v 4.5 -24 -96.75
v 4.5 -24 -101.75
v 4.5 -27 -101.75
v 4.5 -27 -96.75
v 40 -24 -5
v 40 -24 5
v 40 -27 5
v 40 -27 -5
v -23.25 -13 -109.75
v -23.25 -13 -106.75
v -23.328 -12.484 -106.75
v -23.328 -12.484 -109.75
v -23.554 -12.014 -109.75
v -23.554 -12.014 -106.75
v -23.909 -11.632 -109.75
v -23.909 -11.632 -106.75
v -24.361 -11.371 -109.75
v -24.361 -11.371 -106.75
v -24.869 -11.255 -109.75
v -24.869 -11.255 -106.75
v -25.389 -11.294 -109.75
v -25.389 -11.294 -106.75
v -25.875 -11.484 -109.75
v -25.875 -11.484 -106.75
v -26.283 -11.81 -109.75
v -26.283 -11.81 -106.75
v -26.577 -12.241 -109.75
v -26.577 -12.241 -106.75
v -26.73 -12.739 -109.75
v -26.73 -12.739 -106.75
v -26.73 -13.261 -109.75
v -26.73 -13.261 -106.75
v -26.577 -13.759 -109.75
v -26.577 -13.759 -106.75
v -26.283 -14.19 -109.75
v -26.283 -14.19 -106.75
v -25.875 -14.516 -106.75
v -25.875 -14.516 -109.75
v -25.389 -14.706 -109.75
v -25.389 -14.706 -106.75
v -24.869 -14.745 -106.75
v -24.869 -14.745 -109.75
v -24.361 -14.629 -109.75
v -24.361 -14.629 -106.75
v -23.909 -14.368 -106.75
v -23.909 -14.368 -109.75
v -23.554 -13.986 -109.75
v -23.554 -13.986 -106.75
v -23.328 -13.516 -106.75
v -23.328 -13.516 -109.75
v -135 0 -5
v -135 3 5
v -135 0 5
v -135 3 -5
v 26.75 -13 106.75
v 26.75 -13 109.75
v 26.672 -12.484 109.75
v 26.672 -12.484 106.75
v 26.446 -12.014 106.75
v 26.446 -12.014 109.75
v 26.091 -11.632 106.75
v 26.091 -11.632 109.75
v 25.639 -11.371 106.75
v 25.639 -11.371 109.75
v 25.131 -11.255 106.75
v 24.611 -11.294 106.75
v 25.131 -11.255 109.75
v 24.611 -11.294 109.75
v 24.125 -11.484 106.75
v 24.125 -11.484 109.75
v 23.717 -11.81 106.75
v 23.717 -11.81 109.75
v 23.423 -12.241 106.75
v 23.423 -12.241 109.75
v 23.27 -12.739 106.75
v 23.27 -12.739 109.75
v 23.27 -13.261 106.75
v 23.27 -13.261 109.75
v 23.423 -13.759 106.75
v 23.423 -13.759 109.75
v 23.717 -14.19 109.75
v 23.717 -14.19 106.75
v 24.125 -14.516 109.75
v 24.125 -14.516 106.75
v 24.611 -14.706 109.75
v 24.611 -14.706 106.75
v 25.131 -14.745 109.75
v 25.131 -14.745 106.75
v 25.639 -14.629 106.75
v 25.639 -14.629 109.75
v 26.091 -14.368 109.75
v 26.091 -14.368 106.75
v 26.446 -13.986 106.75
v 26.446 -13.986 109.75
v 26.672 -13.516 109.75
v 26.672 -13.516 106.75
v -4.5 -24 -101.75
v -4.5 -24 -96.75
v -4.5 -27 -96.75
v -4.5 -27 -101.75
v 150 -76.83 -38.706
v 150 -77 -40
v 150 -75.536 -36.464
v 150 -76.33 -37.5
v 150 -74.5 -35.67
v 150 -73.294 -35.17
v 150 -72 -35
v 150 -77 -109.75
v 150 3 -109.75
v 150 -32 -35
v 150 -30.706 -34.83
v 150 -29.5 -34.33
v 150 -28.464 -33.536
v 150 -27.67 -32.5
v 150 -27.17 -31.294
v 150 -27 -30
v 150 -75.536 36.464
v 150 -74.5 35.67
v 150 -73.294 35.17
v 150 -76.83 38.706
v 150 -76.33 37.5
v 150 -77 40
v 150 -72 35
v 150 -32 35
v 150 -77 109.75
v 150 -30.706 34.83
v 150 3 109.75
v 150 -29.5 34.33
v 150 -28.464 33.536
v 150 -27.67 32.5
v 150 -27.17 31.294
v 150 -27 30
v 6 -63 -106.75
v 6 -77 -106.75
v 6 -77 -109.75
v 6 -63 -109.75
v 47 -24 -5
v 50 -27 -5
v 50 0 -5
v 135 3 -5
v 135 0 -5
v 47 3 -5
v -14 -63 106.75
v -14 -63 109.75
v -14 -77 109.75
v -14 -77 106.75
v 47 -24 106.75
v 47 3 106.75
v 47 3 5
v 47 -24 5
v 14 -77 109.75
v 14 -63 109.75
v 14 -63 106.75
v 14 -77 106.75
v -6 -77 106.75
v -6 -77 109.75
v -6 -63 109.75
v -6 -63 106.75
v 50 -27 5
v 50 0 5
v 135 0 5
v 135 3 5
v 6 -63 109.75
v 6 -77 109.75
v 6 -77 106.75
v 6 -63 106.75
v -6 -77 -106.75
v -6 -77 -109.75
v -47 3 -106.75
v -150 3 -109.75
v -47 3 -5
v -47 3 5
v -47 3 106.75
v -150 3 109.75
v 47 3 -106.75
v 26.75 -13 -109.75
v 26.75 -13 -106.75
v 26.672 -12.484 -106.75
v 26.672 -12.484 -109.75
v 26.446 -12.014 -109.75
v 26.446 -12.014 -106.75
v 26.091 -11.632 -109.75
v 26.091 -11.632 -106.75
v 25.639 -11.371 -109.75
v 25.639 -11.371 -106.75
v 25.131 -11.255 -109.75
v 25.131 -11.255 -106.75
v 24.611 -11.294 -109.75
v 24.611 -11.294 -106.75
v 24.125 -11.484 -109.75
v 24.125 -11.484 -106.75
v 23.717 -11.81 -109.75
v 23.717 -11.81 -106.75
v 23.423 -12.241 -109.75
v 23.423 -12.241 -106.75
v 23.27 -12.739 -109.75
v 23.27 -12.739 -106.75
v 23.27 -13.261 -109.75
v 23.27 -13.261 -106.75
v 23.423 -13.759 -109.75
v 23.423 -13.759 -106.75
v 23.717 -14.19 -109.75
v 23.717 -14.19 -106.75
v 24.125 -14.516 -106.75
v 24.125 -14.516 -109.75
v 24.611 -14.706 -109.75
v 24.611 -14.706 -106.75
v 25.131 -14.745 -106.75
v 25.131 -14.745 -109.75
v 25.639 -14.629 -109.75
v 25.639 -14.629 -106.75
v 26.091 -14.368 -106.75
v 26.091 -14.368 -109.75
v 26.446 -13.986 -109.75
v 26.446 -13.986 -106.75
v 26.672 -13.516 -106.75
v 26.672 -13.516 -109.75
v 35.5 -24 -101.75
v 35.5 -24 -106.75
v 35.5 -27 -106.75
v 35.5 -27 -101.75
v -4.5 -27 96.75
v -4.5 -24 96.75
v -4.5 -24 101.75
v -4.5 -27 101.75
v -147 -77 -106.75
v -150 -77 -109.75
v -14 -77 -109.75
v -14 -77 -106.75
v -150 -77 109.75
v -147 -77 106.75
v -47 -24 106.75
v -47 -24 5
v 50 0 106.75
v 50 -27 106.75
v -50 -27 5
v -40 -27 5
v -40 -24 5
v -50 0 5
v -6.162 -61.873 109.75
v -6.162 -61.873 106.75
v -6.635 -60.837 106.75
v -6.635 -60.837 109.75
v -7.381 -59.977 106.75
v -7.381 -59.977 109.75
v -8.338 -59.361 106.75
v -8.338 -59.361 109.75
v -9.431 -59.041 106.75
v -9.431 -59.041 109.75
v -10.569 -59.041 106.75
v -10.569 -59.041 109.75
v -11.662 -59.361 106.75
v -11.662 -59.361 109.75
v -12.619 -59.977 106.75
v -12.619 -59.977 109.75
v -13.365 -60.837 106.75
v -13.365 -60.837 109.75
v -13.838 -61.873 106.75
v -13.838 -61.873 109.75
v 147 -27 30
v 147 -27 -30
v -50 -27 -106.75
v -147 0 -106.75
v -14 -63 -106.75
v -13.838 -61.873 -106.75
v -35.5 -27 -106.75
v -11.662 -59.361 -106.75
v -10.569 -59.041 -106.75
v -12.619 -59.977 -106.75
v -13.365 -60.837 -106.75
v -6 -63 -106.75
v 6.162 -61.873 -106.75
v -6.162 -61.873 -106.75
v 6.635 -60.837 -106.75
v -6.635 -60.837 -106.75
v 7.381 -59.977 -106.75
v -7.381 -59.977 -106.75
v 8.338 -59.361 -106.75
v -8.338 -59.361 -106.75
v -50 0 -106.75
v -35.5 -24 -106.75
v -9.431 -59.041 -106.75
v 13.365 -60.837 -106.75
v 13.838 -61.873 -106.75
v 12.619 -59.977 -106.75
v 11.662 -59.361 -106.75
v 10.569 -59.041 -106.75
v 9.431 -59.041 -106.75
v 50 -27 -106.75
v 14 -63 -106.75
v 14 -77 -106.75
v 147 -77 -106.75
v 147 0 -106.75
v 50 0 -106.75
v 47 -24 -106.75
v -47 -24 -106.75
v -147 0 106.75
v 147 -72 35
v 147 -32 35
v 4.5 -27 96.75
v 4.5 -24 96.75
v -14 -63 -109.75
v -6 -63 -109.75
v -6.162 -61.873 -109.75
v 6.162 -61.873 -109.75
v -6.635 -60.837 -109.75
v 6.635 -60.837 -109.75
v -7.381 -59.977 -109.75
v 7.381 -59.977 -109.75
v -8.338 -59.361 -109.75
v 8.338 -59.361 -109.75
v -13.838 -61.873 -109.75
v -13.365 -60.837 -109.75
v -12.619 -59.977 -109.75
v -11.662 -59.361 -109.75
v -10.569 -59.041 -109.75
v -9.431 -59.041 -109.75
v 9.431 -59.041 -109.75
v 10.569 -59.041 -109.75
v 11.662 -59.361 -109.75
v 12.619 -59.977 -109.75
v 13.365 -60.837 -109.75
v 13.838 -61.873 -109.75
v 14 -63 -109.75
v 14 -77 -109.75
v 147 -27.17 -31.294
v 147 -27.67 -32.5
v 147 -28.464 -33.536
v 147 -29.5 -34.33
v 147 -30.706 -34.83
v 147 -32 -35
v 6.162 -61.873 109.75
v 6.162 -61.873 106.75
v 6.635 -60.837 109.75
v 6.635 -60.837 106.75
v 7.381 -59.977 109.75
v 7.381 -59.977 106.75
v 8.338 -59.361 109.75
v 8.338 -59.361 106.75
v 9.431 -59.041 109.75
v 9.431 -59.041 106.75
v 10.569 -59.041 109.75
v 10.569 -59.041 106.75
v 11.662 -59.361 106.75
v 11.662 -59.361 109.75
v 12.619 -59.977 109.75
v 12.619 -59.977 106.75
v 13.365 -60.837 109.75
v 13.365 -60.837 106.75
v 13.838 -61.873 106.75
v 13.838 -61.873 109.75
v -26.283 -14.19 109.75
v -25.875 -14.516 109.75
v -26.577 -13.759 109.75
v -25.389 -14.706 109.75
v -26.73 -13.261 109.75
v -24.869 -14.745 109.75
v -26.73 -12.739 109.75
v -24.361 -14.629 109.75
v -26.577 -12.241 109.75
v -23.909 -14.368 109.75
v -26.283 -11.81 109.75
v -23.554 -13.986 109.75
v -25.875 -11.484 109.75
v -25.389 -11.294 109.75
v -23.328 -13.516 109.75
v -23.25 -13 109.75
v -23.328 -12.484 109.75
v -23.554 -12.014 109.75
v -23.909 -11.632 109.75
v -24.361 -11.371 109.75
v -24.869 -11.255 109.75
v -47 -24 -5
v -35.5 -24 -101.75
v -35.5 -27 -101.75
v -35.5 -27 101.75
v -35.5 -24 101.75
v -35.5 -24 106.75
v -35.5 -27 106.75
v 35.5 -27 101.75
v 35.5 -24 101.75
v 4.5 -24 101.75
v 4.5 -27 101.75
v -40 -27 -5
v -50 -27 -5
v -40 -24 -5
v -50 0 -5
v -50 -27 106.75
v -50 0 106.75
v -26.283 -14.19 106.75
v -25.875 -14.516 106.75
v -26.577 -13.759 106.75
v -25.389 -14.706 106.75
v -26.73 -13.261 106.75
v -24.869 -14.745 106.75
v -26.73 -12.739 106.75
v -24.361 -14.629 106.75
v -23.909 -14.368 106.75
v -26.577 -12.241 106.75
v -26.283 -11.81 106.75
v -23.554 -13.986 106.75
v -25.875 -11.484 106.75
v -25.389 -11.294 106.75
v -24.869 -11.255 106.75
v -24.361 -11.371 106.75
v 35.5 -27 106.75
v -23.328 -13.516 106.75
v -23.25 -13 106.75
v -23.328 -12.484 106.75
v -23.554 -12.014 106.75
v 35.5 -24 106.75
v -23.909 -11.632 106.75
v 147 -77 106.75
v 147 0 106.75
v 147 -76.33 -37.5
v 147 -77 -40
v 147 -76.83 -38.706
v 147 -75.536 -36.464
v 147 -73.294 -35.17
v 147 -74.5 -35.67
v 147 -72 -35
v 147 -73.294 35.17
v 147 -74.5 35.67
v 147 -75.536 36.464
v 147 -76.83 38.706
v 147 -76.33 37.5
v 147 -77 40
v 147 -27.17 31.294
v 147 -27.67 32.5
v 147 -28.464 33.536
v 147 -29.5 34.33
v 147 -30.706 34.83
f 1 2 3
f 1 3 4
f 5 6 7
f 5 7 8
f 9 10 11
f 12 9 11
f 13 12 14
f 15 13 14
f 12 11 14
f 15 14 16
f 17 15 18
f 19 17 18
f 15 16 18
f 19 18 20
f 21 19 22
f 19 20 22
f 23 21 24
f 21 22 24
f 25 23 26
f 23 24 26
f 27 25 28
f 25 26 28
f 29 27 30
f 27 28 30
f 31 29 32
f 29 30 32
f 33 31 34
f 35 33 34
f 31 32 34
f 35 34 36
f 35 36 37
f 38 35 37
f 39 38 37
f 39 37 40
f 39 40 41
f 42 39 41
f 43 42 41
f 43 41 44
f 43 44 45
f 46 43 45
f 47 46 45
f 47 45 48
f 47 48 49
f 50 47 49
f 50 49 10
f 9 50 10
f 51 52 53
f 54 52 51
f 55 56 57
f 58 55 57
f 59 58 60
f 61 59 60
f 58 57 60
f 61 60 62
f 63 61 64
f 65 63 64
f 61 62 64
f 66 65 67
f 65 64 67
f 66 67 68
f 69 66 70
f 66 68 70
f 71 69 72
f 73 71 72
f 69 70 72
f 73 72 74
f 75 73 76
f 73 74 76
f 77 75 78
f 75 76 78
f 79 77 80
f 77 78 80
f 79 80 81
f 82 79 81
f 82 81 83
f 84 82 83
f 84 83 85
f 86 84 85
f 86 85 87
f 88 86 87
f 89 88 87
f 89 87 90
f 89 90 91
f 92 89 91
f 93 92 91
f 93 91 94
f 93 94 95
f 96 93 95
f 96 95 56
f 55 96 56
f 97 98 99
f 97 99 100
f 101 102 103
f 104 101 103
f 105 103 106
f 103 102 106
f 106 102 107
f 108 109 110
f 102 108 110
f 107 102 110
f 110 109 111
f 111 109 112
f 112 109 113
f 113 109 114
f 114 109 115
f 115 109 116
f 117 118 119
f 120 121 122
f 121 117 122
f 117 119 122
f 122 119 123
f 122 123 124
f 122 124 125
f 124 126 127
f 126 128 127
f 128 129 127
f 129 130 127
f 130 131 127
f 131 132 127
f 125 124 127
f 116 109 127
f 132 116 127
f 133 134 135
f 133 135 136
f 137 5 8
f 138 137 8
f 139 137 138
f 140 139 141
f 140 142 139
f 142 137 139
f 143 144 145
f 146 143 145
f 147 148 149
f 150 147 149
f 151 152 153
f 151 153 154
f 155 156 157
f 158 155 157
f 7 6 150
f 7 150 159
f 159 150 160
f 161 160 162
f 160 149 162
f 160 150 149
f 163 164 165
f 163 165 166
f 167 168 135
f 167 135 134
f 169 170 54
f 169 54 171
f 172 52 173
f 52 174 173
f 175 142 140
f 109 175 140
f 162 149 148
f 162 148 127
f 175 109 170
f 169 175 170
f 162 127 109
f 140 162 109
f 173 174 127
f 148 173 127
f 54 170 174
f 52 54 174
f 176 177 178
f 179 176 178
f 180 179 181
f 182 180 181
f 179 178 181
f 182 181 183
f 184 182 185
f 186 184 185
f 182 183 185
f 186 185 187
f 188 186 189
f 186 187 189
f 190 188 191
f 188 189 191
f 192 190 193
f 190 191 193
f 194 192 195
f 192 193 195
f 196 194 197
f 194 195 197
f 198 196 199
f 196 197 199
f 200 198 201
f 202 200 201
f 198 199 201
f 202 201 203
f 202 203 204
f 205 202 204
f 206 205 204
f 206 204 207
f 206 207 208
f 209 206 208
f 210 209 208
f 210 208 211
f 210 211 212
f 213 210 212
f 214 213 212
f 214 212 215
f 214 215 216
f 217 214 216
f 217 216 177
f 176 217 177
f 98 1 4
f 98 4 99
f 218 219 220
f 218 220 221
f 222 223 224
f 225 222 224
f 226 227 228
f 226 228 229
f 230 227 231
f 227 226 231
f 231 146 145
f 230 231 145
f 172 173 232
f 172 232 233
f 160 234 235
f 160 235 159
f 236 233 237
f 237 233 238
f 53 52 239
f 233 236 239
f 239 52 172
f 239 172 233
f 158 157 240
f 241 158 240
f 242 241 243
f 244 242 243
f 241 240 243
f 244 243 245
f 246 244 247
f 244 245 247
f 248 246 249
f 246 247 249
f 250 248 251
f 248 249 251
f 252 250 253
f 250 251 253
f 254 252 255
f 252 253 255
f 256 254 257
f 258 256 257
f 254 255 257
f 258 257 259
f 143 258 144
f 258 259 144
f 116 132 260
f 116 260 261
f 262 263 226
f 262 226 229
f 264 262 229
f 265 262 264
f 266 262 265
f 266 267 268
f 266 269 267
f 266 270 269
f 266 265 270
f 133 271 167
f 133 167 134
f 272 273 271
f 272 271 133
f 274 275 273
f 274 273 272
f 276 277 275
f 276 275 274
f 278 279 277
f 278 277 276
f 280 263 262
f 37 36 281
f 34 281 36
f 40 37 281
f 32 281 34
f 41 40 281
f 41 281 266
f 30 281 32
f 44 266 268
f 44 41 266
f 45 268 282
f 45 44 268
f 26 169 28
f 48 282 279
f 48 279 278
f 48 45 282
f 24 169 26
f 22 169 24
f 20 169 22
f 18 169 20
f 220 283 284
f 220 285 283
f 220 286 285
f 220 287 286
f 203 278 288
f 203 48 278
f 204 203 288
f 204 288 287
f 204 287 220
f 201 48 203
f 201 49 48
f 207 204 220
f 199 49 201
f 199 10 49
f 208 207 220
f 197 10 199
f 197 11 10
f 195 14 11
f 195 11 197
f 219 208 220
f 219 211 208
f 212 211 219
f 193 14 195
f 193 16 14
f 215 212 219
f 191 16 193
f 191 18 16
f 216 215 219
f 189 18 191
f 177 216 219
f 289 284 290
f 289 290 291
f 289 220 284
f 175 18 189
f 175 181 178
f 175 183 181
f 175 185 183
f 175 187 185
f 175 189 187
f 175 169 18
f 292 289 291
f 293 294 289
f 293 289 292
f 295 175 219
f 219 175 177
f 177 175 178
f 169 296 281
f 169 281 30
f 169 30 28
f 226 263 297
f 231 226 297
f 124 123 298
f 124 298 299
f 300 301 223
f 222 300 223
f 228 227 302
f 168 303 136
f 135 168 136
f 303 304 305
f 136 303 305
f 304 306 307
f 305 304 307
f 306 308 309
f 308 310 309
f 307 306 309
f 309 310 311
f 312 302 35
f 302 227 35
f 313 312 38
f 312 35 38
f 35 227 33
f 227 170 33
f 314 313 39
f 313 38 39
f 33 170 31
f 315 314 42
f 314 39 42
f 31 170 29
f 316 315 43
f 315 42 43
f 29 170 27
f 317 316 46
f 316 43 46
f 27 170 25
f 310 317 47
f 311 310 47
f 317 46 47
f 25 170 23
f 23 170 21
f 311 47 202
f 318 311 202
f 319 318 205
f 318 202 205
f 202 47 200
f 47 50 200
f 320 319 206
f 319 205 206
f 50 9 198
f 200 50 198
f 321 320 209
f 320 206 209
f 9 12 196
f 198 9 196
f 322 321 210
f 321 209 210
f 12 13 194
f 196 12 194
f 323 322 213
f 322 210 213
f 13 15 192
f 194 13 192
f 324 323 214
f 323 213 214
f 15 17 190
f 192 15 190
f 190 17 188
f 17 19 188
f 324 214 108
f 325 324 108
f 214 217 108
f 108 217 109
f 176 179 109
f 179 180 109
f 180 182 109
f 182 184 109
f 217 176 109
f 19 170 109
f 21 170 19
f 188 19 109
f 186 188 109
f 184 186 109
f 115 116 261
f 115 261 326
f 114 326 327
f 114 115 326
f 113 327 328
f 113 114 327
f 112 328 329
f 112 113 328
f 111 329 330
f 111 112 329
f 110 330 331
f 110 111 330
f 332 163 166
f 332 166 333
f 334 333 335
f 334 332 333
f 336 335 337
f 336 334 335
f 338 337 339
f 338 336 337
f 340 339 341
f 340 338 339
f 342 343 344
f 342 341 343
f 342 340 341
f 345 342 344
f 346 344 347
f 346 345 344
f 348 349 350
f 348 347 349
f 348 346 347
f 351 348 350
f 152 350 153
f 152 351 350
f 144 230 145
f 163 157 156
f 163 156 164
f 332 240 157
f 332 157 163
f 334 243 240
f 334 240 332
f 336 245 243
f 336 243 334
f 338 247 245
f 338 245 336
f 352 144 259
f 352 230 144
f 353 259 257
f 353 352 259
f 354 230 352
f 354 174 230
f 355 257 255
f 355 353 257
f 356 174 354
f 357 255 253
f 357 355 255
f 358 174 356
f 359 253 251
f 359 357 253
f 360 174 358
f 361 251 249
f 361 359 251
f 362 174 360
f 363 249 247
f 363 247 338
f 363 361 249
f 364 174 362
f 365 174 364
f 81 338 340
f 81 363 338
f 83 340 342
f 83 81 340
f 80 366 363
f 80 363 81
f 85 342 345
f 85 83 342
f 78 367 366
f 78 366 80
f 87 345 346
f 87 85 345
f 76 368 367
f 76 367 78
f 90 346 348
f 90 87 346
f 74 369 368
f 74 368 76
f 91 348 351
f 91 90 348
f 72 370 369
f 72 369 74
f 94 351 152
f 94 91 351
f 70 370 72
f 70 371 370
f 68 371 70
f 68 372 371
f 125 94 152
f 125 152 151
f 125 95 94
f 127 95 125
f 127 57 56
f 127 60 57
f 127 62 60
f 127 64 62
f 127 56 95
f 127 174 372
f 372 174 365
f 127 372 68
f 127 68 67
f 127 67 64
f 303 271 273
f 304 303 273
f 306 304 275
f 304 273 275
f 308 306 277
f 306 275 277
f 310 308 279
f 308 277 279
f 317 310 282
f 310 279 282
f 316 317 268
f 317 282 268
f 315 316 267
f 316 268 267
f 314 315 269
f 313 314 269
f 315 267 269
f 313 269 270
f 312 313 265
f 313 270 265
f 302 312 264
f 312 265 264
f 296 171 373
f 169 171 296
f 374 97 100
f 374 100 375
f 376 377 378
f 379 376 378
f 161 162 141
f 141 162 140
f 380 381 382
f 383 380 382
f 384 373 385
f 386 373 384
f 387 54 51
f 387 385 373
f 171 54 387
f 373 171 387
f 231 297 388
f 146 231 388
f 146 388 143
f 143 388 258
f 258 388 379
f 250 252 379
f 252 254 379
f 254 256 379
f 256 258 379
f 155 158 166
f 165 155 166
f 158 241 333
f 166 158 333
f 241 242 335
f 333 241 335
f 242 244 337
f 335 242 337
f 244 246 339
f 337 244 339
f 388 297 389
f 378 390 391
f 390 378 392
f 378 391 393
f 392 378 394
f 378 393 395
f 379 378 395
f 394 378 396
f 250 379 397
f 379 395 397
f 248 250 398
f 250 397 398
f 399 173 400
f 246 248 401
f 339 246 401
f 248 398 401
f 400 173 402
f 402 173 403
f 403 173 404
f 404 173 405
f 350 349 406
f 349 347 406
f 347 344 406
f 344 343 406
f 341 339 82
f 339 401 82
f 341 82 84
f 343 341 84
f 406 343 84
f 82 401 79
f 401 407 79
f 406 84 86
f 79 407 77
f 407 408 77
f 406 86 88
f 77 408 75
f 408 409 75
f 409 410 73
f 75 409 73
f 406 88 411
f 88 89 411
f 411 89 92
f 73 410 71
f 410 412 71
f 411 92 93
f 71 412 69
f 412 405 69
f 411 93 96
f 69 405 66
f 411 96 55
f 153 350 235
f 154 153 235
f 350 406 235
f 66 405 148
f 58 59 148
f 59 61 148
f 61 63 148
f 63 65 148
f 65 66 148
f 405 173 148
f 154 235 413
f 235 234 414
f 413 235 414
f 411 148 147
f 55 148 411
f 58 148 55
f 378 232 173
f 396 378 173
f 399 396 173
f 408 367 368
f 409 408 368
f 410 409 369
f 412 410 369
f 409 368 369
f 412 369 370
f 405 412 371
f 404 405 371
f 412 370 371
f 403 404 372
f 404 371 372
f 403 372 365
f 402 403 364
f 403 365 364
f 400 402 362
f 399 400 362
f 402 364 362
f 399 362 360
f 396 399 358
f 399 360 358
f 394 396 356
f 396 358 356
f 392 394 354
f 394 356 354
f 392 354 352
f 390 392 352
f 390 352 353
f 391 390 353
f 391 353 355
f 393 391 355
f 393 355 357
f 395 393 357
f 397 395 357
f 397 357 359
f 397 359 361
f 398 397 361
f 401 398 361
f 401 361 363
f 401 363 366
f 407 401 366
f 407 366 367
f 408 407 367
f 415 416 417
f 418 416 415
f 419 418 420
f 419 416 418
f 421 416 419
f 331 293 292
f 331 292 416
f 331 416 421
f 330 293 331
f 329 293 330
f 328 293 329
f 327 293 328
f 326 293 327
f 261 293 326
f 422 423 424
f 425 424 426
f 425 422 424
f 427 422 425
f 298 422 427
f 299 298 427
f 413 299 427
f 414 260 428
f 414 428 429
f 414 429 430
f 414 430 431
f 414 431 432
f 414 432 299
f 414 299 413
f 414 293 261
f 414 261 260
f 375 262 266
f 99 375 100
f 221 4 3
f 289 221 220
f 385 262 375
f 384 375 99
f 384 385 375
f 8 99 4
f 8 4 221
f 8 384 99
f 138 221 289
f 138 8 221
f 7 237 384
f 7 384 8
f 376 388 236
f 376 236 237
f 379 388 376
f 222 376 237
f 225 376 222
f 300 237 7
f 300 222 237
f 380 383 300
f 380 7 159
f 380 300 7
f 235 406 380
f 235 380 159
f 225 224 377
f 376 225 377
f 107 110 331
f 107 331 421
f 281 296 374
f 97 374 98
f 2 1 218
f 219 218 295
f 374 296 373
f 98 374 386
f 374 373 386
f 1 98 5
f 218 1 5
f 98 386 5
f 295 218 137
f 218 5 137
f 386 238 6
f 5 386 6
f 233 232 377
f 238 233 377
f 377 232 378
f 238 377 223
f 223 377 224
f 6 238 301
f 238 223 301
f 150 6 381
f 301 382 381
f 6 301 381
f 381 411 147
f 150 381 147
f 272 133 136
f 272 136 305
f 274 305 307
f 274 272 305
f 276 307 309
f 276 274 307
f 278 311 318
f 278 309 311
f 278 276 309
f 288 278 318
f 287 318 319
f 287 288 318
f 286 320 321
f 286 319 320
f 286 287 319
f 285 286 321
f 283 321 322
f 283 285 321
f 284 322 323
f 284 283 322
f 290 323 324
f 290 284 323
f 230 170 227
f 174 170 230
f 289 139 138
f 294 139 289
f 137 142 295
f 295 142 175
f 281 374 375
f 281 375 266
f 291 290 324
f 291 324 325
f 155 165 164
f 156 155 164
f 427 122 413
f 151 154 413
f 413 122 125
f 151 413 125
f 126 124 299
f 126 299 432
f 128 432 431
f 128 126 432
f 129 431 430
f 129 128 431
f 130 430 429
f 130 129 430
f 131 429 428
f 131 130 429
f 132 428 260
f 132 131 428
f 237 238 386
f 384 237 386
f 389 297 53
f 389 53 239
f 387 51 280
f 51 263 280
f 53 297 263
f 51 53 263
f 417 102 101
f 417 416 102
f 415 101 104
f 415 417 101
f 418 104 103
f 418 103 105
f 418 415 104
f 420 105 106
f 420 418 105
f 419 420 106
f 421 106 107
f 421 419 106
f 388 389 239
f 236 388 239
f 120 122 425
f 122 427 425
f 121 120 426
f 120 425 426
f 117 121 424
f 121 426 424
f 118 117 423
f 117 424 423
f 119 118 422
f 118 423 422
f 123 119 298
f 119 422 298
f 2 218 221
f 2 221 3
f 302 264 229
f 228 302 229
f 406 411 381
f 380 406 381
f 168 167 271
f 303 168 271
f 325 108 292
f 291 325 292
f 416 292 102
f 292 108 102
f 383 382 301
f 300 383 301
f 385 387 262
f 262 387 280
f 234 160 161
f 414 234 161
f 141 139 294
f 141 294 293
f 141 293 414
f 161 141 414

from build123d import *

# Parameters (mm, degrees)
SKETCH1_W             = 100
SKETCH1_H             = 213.5
BOSS_EXTRUDE1_DEPTH   = 3
BOSS_EXTRUDE1_2_DEPTH = 3
SKETCH2_W             = 300
SKETCH2_H             = 80
BOSS_EXTRUDE2_DEPTH   = 3
SKETCH4_W             = 3
SKETCH4_H             = 213.5
BOSS_EXTRUDE4_DEPTH   = 30
SKETCH5_W             = 94
SKETCH5_H             = 213.5
BOSS_EXTRUDE5_DEPTH   = 3
CUT_EXTRUDE2_REACH    = 195.272
CUT_EXTRUDE1_REACH    = 204.349
SKETCH3_W             = 95
SKETCH3_H             = 10
SKETCH7_W             = 213.5
SKETCH7_H             = 77
BOSS_EXTRUDE6_DEPTH   = 3
SKETCH8_R             = 1.75
CUT_EXTRUDE3_DEPTH    = 277.783760362
CUT_EXTRUDE4_REACH    = 330.594
FILLET1_R             = 5


with BuildPart() as part:
    # Sketch1 → Boss-Extrude1 (new body)
    with BuildSketch(Plane(origin=(0, 0, 0), x_dir=(1, 0, 0), z_dir=(0, 1, 0))):
        with Locations((-100, 0)):
            Rectangle(SKETCH1_W, SKETCH1_H)
    extrude(amount=BOSS_EXTRUDE1_DEPTH)



with BuildPart() as body_2:
    # Sketch1 → Boss-Extrude1 2 (new body)
    with BuildSketch(Plane(origin=(0, 0, 0), x_dir=(1, 0, 0), z_dir=(0, 1, 0))):
        with Locations((100, 0)):
            Rectangle(SKETCH1_W, SKETCH1_H)
    extrude(amount=BOSS_EXTRUDE1_2_DEPTH)


with BuildPart() as part_1:
    add(part.part)

    add(body_2.part)  # Boss-Extrude2 merges body 2
    # Sketch2 → Boss-Extrude2 (add)
    with BuildSketch(Plane.XY.offset(106.75)):
        with Locations((0, -37)):
            Rectangle(SKETCH2_W, SKETCH2_H)
    boss_extrude2 = extrude(amount=BOSS_EXTRUDE2_DEPTH)

    # Mirror1: Boss-Extrude2 across plane
    add(boss_extrude2.mirror(Plane.XY))

    # Sketch4 → Boss-Extrude4 (add)
    with BuildSketch(Plane(origin=(0, 3, 0), x_dir=(1, 0, 0), z_dir=(0, 1, 0))):
        with Locations((-48.5, 0)):
            Rectangle(SKETCH4_W, SKETCH4_H)
        with Locations((48.5, 0)):
            Rectangle(SKETCH4_W, SKETCH4_H)
    extrude(amount=-BOSS_EXTRUDE4_DEPTH)

    # Sketch5 → Boss-Extrude5 (add)
    with BuildSketch(Plane.XZ.offset(27)):
        Rectangle(SKETCH5_W, SKETCH5_H)
    extrude(amount=-BOSS_EXTRUDE5_DEPTH)

    # Sketch6 → Cut-Extrude2 (cut, up to next)
    with BuildSketch(Plane(origin=(0, -24, 0), x_dir=(1, 0, 0), z_dir=(0, 1, 0)), mode=Mode.PRIVATE) as cut_extrude2_sk1:
        Polygon((-35.5, 106.75), (35.5, 106.75), (35.5, 101.75), (4.5, 101.75), (4.5, 96.75), (-4.5, 96.75), (-4.5, 101.75), (-35.5, 101.75), align=None)
    cut_extrude2_tool1 = extrude(cut_extrude2_sk1.sketch, amount=-CUT_EXTRUDE2_REACH, mode=Mode.PRIVATE) & part_1.part
    # Sketch6 → Cut-Extrude2 (cut, up to next)
    with BuildSketch(Plane(origin=(0, -24, 0), x_dir=(1, 0, 0), z_dir=(0, 1, 0)), mode=Mode.PRIVATE) as cut_extrude2_sk2:
        Polygon((-35.5, -106.75), (35.5, -106.75), (35.5, -101.75), (4.5, -101.75), (4.5, -96.75), (-4.5, -96.75), (-4.5, -101.75), (-35.5, -101.75), align=None)
    cut_extrude2_tool2 = extrude(cut_extrude2_sk2.sketch, amount=-CUT_EXTRUDE2_REACH, mode=Mode.PRIVATE) & part_1.part
    add(cut_extrude2_tool1.solids().sort_by_distance((0, -24, -103.6875))[0], mode=Mode.SUBTRACT)
    add(cut_extrude2_tool2.solids().sort_by_distance((0, -24, 103.6875))[0], mode=Mode.SUBTRACT)

    # Sketch3 → Cut-Extrude1 (cut, up to next)
    with BuildSketch(Plane(origin=(0, 3, 0), x_dir=(1, 0, 0), z_dir=(0, 1, 0)), mode=Mode.PRIVATE) as cut_extrude1_sk1:
        with Locations((-87.5, 0)):
            Rectangle(SKETCH3_W, SKETCH3_H)
    cut_extrude1_tool1 = extrude(cut_extrude1_sk1.sketch, amount=-CUT_EXTRUDE1_REACH, mode=Mode.PRIVATE) & part_1.part
    # Sketch3 → Cut-Extrude1 (cut, up to next)
    with BuildSketch(Plane(origin=(0, 3, 0), x_dir=(1, 0, 0), z_dir=(0, 1, 0)), mode=Mode.PRIVATE) as cut_extrude1_sk2:
        with Locations((87.5, 0)):
            Rectangle(SKETCH3_W, SKETCH3_H)
    cut_extrude1_tool2 = extrude(cut_extrude1_sk2.sketch, amount=-CUT_EXTRUDE1_REACH, mode=Mode.PRIVATE) & part_1.part
    add(cut_extrude1_tool1.solids().sort_by_distance((-87.5, 3, 0))[0], mode=Mode.SUBTRACT)
    add(cut_extrude1_tool2.solids().sort_by_distance((87.5, 3, 0))[0], mode=Mode.SUBTRACT)

    # Sketch7 → Boss-Extrude6 (add)
    with BuildSketch(Plane.ZY.offset(150)):
        with Locations((0, -38.5)):
            Rectangle(SKETCH7_W, SKETCH7_H)
    boss_extrude6 = extrude(amount=-BOSS_EXTRUDE6_DEPTH)

    # Mirror2: Boss-Extrude6 across plane
    add(boss_extrude6.mirror(Plane(origin=(0, 0, 0), x_dir=(0, 0, 1), z_dir=(1, 0, 0))))

    # Sketch8 → Cut-Extrude3 (cut, through all)
    with BuildSketch(Plane.XY.offset(109.75)):
        with Locations((-25, -13)):
            Circle(SKETCH8_R)
        with Locations((25, -13)):
            Circle(SKETCH8_R)
        with BuildLine():
            Line((-14, -63), (-14, -77))
            Line((-14, -77), (-6, -77))
            Line((-6, -77), (-6, -63))
            ThreePointArc((-6, -63), (-10, -59), (-14, -63))
        make_face()
        with BuildLine():
            Line((14, -63), (14, -77))
            Line((14, -77), (6, -77))
            Line((6, -77), (6, -63))
            ThreePointArc((6, -63), (10, -59), (14, -63))
        make_face()
    extrude(amount=-CUT_EXTRUDE3_DEPTH, mode=Mode.SUBTRACT)

    # Sketch10 → Cut-Extrude4 (cut, up to next)
    with BuildSketch(Plane(origin=(150, 0, 0), x_dir=(0, 0, -1), z_dir=(1, 0, 0)), mode=Mode.PRIVATE) as cut_extrude4_sk1:
        with BuildLine():
            Line((-30, -27), (30, -27))
            ThreePointArc((30, -27), (33.535533906, -28.464466094), (35, -32))
            Line((35, -32), (35, -77))
            Line((35, -77), (-35, -77))
            Line((-35, -77), (-35, -32))
            ThreePointArc((-35, -32), (-33.535533906, -28.464466094), (-30, -27))
        make_face()
    cut_extrude4_tool1 = extrude(cut_extrude4_sk1.sketch, amount=-CUT_EXTRUDE4_REACH, mode=Mode.PRIVATE) & part_1.part
    add(cut_extrude4_tool1.solids().sort_by_distance((150, -52.073445, 0))[0], mode=Mode.SUBTRACT)

    # Fillet1
    fillet1_edges = [part_1.edges().sort_by_distance(p)[0] for p in [
        (148.5, -77, 35),
        (148.5, -77, -35),
    ]]
    fillet(fillet1_edges, radius=FILLET1_R)


solid = part_1.part
